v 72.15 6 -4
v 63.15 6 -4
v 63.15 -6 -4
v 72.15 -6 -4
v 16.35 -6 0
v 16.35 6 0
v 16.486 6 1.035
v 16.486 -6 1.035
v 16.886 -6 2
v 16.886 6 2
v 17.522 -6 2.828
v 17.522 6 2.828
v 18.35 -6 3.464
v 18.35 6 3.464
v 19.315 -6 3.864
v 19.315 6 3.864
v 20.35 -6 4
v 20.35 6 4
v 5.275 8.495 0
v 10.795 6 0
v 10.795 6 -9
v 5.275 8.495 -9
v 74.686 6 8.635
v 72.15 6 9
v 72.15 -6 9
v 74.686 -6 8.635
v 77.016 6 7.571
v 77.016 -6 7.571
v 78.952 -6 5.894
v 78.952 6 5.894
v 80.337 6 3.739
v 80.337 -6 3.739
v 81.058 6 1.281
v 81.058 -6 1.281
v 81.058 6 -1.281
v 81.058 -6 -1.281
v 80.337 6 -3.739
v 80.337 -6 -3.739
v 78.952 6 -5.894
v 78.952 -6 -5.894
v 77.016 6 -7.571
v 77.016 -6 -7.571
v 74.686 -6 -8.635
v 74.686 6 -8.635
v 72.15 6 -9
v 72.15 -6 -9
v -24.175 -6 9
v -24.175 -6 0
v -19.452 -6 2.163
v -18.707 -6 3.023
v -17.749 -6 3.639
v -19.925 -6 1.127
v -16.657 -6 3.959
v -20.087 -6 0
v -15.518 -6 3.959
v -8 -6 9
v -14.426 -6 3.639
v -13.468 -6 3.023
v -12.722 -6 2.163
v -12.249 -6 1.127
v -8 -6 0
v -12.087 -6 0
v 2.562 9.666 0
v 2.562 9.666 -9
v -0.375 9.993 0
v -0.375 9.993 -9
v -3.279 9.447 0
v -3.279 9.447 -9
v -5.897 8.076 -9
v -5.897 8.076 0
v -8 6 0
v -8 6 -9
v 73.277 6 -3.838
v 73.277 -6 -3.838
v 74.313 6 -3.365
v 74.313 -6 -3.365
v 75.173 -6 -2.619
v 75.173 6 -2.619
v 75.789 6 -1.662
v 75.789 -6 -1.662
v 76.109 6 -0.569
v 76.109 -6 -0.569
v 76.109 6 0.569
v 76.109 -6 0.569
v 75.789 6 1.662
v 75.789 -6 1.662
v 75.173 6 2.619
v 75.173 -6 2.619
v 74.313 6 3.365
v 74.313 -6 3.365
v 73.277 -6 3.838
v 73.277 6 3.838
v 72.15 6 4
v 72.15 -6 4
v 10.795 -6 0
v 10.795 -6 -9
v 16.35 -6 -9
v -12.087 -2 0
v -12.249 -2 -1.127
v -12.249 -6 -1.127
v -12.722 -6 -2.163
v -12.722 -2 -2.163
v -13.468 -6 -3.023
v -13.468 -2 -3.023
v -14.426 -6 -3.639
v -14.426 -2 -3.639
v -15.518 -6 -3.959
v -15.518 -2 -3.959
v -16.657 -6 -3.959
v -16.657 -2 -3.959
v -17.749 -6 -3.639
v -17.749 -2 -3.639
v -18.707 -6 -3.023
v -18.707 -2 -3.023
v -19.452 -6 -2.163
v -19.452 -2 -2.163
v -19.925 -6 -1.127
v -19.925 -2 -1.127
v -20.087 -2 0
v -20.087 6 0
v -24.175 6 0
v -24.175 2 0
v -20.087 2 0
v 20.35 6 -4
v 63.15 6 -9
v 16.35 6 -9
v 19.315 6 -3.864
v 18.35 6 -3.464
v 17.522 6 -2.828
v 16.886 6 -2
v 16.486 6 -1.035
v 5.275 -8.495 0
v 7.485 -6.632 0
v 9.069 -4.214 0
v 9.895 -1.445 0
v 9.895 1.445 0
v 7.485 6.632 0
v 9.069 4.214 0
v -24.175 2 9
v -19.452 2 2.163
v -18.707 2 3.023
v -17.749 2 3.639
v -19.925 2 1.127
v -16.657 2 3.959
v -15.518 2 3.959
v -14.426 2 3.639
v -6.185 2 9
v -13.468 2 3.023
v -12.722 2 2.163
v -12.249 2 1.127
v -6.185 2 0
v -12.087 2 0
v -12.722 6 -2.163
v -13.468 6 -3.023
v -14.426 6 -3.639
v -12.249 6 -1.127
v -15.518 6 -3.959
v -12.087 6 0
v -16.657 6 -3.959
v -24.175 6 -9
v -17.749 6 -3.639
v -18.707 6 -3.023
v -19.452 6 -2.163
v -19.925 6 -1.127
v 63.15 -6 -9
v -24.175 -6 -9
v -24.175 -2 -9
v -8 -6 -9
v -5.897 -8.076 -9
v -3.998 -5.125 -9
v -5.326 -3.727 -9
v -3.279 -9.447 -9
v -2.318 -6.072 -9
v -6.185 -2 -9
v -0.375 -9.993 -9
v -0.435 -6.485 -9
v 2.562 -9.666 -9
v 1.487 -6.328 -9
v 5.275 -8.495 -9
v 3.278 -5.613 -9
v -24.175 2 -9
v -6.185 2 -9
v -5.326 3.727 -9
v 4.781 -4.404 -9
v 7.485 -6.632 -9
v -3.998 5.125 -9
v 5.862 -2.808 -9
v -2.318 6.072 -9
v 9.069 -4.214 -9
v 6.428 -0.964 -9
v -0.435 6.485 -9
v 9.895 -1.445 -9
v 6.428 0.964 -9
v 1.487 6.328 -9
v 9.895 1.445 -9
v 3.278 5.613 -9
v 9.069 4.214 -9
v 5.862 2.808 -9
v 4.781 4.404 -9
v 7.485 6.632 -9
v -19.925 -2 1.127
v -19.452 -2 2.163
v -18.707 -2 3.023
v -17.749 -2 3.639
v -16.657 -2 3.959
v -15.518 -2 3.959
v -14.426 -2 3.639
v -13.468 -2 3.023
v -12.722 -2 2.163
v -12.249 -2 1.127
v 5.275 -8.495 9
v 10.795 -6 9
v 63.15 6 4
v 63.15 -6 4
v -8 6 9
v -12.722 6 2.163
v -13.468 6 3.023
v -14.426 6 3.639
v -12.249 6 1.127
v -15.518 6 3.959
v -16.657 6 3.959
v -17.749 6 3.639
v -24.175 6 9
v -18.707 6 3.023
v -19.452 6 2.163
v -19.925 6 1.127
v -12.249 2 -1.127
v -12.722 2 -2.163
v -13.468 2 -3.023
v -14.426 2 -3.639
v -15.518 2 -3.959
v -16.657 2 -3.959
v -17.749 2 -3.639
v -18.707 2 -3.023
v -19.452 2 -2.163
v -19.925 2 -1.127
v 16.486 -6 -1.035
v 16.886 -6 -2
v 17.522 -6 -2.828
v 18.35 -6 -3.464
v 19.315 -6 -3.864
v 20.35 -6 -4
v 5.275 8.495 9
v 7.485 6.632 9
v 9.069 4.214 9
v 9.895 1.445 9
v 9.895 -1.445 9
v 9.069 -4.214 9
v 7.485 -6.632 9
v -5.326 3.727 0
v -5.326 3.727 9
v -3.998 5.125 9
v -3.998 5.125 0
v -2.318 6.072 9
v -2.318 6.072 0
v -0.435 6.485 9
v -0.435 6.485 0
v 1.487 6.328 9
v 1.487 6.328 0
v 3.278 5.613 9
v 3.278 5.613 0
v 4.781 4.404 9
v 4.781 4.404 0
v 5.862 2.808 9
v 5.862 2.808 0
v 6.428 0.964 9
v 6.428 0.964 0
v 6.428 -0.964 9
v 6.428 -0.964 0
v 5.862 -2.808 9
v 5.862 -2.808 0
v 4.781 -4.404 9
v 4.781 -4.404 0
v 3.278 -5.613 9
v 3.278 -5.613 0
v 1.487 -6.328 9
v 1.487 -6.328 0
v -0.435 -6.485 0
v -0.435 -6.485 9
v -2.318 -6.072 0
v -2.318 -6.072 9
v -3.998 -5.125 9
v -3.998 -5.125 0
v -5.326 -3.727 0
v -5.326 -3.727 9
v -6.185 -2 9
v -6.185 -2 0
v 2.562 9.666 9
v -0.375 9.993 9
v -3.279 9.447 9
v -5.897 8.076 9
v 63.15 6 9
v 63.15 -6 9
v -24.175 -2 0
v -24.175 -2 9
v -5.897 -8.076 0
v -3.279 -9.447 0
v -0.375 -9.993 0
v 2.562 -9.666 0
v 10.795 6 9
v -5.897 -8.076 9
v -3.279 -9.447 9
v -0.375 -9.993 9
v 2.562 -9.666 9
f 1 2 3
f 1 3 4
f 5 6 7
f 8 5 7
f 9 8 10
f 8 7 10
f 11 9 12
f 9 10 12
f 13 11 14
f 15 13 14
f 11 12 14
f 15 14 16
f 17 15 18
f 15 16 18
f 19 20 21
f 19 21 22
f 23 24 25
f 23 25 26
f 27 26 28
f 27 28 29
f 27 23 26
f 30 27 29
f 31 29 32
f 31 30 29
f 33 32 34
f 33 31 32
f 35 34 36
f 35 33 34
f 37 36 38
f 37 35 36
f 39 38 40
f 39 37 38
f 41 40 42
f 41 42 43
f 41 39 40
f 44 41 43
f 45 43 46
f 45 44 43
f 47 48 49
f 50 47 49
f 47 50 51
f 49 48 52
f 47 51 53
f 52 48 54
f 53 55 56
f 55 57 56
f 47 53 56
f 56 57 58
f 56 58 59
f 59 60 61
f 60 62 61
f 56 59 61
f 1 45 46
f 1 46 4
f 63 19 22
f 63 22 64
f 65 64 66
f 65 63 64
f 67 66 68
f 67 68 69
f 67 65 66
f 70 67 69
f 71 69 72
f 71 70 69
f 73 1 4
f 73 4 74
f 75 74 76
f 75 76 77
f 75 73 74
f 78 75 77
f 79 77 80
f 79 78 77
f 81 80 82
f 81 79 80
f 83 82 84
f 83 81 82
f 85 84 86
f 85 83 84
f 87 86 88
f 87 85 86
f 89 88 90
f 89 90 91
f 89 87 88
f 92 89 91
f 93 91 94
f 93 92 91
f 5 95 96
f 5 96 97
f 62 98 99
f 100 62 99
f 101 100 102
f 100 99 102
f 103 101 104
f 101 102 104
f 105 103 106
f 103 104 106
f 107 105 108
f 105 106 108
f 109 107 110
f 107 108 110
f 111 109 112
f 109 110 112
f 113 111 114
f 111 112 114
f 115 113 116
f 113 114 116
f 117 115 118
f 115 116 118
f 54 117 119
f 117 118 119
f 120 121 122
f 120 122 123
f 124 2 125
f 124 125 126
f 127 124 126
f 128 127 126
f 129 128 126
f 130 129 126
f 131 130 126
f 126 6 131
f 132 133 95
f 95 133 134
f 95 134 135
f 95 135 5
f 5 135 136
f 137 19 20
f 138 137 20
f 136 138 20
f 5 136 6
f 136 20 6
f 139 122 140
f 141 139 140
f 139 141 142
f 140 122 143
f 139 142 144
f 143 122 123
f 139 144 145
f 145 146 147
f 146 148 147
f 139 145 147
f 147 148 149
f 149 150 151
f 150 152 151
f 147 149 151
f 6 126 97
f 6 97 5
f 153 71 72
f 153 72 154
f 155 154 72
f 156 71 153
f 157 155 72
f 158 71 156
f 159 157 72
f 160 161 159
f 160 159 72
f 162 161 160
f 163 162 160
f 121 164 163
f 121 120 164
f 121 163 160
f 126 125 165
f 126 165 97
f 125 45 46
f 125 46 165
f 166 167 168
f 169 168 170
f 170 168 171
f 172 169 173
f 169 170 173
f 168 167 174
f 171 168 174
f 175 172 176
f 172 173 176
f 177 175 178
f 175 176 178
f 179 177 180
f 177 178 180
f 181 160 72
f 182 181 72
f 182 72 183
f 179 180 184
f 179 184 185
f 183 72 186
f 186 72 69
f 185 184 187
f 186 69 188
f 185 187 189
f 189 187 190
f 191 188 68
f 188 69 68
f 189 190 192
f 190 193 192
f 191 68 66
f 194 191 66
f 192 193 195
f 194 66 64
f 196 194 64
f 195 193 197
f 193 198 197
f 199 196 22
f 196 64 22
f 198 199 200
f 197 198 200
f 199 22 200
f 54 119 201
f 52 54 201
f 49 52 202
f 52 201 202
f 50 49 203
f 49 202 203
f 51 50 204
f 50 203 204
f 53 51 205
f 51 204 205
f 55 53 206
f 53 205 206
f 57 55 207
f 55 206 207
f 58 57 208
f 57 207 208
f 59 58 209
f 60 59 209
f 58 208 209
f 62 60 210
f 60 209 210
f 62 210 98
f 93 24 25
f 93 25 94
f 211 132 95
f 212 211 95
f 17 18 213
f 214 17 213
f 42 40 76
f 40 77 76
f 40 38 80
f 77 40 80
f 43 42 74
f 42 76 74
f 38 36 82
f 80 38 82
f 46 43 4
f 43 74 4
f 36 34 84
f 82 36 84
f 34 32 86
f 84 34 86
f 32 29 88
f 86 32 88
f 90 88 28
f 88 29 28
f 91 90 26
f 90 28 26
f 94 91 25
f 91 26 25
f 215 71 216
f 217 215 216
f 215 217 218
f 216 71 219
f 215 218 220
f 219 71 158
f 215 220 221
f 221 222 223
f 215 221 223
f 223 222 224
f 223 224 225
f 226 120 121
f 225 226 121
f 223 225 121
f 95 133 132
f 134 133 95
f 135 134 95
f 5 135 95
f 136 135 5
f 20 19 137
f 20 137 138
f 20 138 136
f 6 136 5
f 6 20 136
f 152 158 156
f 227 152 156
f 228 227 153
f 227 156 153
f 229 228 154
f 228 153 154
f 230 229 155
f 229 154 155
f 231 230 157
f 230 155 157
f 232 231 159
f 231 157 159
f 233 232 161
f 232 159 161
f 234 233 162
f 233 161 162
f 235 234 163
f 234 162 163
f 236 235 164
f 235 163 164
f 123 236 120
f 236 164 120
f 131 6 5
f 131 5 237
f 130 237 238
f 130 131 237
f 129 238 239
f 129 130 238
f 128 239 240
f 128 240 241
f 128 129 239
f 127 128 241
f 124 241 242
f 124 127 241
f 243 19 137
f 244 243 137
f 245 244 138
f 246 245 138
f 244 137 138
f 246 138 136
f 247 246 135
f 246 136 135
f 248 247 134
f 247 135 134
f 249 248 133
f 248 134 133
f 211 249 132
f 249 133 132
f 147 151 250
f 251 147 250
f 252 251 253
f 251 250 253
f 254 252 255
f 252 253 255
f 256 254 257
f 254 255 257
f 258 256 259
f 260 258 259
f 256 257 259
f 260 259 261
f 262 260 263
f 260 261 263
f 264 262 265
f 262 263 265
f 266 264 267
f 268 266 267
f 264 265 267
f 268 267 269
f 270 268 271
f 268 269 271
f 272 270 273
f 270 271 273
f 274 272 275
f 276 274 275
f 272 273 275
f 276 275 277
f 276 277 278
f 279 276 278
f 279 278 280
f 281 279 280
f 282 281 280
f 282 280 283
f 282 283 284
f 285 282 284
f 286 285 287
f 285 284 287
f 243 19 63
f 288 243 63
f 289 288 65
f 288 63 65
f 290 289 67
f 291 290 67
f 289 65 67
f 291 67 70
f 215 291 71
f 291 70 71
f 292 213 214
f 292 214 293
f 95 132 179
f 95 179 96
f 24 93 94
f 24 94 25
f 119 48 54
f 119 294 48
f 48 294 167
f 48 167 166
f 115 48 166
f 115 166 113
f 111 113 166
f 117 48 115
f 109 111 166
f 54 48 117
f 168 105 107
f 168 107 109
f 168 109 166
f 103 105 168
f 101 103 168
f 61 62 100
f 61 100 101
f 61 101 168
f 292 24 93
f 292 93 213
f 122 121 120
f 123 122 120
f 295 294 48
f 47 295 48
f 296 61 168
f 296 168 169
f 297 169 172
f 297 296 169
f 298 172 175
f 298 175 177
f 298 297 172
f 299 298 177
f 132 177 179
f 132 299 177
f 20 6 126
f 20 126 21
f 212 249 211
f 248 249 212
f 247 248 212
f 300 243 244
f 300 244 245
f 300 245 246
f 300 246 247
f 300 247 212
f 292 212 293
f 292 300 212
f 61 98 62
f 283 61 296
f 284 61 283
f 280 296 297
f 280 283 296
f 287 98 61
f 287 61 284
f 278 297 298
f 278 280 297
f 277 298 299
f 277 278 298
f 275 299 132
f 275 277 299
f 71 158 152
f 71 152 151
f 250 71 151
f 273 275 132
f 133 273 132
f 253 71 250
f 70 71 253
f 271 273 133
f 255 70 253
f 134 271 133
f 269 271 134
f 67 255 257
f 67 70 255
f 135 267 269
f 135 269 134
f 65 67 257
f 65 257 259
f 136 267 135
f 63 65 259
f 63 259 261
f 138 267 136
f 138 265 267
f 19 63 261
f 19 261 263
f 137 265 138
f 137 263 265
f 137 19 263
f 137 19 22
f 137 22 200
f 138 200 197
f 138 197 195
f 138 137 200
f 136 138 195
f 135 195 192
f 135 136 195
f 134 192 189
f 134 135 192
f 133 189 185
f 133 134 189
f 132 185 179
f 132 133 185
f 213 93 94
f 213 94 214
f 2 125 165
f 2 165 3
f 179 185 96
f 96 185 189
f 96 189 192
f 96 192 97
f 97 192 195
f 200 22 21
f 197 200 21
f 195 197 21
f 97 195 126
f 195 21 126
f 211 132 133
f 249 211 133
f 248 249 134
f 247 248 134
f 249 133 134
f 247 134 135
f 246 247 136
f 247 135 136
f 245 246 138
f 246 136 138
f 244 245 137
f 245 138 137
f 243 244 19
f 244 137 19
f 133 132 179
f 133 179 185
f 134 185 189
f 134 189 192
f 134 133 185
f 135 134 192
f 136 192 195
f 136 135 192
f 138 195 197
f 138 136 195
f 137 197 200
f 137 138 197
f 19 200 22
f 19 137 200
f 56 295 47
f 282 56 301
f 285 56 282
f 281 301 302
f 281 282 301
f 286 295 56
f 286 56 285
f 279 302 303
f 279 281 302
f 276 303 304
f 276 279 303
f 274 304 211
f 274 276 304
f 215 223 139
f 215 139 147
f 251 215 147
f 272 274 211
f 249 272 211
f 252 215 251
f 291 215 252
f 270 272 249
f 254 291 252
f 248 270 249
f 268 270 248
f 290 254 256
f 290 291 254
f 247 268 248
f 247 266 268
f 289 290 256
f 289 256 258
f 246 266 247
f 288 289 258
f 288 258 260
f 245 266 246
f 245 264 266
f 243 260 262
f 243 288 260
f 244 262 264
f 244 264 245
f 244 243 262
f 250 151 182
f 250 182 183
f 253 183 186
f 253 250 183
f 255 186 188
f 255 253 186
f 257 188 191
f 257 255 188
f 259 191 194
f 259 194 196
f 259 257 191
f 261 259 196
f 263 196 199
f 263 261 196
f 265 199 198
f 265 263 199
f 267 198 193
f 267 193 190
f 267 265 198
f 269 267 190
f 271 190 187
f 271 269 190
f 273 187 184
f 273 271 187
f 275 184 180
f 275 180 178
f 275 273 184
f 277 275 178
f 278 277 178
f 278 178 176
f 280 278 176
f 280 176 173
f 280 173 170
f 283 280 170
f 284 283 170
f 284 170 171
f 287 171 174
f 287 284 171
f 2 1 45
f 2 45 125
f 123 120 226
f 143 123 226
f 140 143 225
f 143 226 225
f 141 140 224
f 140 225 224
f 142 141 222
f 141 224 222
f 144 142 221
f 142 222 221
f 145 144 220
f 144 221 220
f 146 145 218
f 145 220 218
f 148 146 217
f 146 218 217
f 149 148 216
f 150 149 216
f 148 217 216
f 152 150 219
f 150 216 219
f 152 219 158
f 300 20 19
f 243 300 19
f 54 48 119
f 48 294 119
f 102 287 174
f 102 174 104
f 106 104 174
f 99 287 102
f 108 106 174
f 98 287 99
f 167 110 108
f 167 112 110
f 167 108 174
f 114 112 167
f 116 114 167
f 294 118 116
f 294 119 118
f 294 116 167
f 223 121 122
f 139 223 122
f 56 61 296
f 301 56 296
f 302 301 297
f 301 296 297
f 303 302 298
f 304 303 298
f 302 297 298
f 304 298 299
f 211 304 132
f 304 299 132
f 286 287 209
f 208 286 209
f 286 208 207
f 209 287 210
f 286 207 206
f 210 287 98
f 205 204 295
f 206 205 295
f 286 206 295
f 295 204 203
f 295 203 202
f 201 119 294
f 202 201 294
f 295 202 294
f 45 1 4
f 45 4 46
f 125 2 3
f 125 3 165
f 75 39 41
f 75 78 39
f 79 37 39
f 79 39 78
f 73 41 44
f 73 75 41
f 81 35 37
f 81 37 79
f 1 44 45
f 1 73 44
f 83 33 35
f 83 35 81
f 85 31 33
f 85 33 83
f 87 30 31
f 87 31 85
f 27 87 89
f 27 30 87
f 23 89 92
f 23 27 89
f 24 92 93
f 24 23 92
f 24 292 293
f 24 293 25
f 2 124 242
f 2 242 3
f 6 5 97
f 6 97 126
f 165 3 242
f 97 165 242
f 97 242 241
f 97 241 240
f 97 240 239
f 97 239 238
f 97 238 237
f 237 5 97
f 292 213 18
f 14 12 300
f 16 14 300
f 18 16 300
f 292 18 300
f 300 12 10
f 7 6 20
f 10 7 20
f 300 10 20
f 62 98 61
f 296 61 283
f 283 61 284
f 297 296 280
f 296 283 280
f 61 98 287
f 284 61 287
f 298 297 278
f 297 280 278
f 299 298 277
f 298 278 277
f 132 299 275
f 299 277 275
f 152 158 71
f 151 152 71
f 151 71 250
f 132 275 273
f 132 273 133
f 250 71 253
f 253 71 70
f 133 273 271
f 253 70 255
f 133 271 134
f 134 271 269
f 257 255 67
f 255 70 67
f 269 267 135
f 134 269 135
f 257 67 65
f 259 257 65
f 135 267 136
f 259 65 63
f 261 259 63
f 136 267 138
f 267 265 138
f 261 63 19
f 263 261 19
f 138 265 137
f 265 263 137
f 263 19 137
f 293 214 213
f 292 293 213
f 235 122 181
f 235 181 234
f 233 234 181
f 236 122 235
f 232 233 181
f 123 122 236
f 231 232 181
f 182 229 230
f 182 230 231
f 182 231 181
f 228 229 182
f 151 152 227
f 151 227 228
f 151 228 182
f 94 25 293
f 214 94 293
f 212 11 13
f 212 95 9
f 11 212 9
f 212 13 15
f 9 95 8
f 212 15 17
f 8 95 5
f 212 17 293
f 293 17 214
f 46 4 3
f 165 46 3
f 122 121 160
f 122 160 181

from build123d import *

# Parameters (mm, degrees)
F1_DEPTH  = 9
F2_DEPTH  = 9
F4_DEPTH  = 9
F5_DEPTH  = 9
F6_DEPTH  = 9
F8_D      = 8
F8_2_D    = 8
F3_W      = 42.8
F3_H      = 4
F9_DEPTH  = 25
F10_DEPTH = 12
F11_DEPTH = 12
F12_DEPTH = 12


# Not quite as in the source:
# - a feature names something its author has since deleted; it is built from what else it names


with BuildPart() as f1:
    # F0 (on Top) → F1 (new body)
    with BuildSketch(Plane.XY):
        with BuildLine():
            ThreePointArc((5.2753381173, -8.4953403551), (10, 0), (5.2753381173, 8.4953403551))
            ThreePointArc((5.2753381173, 8.4953403551), (-1.8473295498, 9.8278875418), (-8, 6))
            Line((-8, 6), (-24.1746007293, 6))
            Line((-24.1746007293, 6), (-24.1746007293, 2))
            Line((-24.1746007293, 2), (-8.1069414701, 2))
            Line((-8.1069414701, 2), (-6.1846584384, 2))
            ThreePointArc((-6.1846584384, 2), (6.5, 0), (-6.1846584384, -2))
            Line((-6.1846584384, -2), (-8.1069414701, -2))
            Line((-8.1069414701, -2), (-24.1746007293, -2))
            Line((-24.1746007293, -2), (-24.1746007293, -6))
            Line((-24.1746007293, -6), (-8, -6))
            ThreePointArc((-8, -6), (-1.8473295498, -9.8278875418), (5.2753381173, -8.4953403551))
        make_face()
    extrude(amount=F1_DEPTH)

    # F8 (through all)
    with Locations(Plane.XZ.offset(6)):
        with Locations((-16.0873003646, 0)):
            Hole(F8_D / 2)


with BuildPart() as f2:
    # F0 (on Top) → F2 (new body)
    with BuildSketch(Plane.XY):
        Polygon((63.15, 0), (16.35, 0), (16.35, -6), (62.2006830499, -6), (63.15, -6), (63.15, -5.0506830499), (63.15, -3.4493169501), (63.15, -2.5), align=None)
        Polygon((16.35, 6), (16.35, 0), (63.15, 0), (63.15, 2.5), (63.15, 3.4493169501), (63.15, 5.0506830499), (63.15, 6), (62.2006830499, 6), align=None)
    extrude(amount=F2_DEPTH)

    # F0 (on Top) → F4 (join)
    with BuildSketch(Plane.XY):
        with BuildLine():
            Line((16.35, -6), (16.35, 0))
            Line((16.35, 0), (16.35, 6))
            Line((16.35, 6), (10.7945588145, 6))
            Line((10.7945588145, 6), (5.2753381173, 8.4953403551))
            ThreePointArc((5.2753381173, 8.4953403551), (10, 0), (5.2753381173, -8.4953403551))
            Line((5.2753381173, -8.4953403551), (10.7945588145, -6))
            Line((10.7945588145, -6), (16.35, -6))
        make_face()
    extrude(amount=F4_DEPTH)

    # F3 (on face) → F9 (cut)
    with BuildSketch(Plane(origin=(0, 6, 0), x_dir=(-1, 0, 0), z_dir=(0, 1, 0))):
        with Locations((-41.75, 2)):
            Rectangle(F3_W, F3_H)
        Polygon((-20.35, 0), (-63.15, 0), (-63.15, -4), (-42.4068458378, -4), (-20.35, -4), align=None)
        with BuildLine():
            Line((-16.35, 0), (-20.35, 0))
            Line((-20.35, 0), (-20.35, -4))
            ThreePointArc((-20.35, -4), (-17.5215728753, -2.8284271247), (-16.35, 0))
        make_face()
        with BuildLine():
            Line((-20.35, 4), (-20.35, 0))
            Line((-20.35, 0), (-16.35, 0))
            ThreePointArc((-16.35, 0), (-17.5215728753, 2.8284271247), (-20.35, 4))
        make_face()
        with BuildLine():
            Line((-68.15, 0), (-63.15, 0))
            ThreePointArc((-63.15, 0), (-63.3875711206, 2.0542249469), (-64.0877422517, 4))
            Line((-64.0877422517, 4), (-72.15, 4))
            ThreePointArc((-72.15, 4), (-69.3215728753, 2.8284271247), (-68.15, 0))
        make_face()
        with BuildLine():
            ThreePointArc((-64.0877422517, -4), (-63.3875711206, -2.0542249469), (-63.15, 0))
            Line((-63.15, 0), (-68.15, 0))
            ThreePointArc((-68.15, 0), (-69.3215728753, -2.8284271247), (-72.15, -4))
            Line((-72.15, -4), (-64.0877422517, -4))
        make_face()
        with BuildLine():
            ThreePointArc((-64.0877422517, 4), (-63.3875711206, 2.0542249469), (-63.15, 0))
            Line((-63.15, 0), (-63.15, 4))
            Line((-63.15, 4), (-64.0877422517, 4))
        make_face()
        with BuildLine():
            Line((-63.15, -4), (-63.15, 0))
            ThreePointArc((-63.15, 0), (-63.3875711206, -2.0542249469), (-64.0877422517, -4))
            Line((-64.0877422517, -4), (-63.15, -4))
        make_face()
        with BuildLine():
            Line((-72.15, 0), (-68.15, 0))
            ThreePointArc((-68.15, 0), (-69.3215728753, 2.8284271247), (-72.15, 4))
            Line((-72.15, 4), (-72.15, 0))
        make_face()
        with BuildLine():
            ThreePointArc((-72.15, -4), (-69.3215728753, -2.8284271247), (-68.15, 0))
            Line((-68.15, 0), (-72.15, 0))
            Line((-72.15, 0), (-72.15, -4))
        make_face()
        with BuildLine():
            Line((-72.15, -4), (-72.15, 0))
            Line((-72.15, 0), (-72.15, 4))
            ThreePointArc((-72.15, 4), (-76.15, 0), (-72.15, -4))
        make_face()
    extrude(amount=-F9_DEPTH, mode=Mode.SUBTRACT)


with BuildPart() as f5:
    # F0 (on Top) → F5 (new body)
    with BuildSketch(Plane.XY):
        with BuildLine():
            Line((16.35, -6), (16.35, 0))
            Line((16.35, 0), (16.35, 6))
            Line((16.35, 6), (10.7945588145, 6))
            Line((10.7945588145, 6), (5.2753381173, 8.4953403551))
            ThreePointArc((5.2753381173, 8.4953403551), (10, 0), (5.2753381173, -8.4953403551))
            Line((5.2753381173, -8.4953403551), (10.7945588145, -6))
            Line((10.7945588145, -6), (16.35, -6))
        make_face()
    extrude(amount=-F5_DEPTH)


with BuildPart() as f6:
    # F0 (on Top) → F6 (new body)
    with BuildSketch(Plane.XY):
        with BuildLine():
            ThreePointArc((5.2753381173, -8.4953403551), (10, 0), (5.2753381173, 8.4953403551))
            ThreePointArc((5.2753381173, 8.4953403551), (-1.8473295498, 9.8278875418), (-8, 6))
            Line((-8, 6), (-24.1746007293, 6))
            Line((-24.1746007293, 6), (-24.1746007293, 2))
            Line((-24.1746007293, 2), (-8.1069414701, 2))
            Line((-8.1069414701, 2), (-6.1846584384, 2))
            ThreePointArc((-6.1846584384, 2), (6.5, 0), (-6.1846584384, -2))
            Line((-6.1846584384, -2), (-8.1069414701, -2))
            Line((-8.1069414701, -2), (-24.1746007293, -2))
            Line((-24.1746007293, -2), (-24.1746007293, -6))
            Line((-24.1746007293, -6), (-8, -6))
            ThreePointArc((-8, -6), (-1.8473295498, -9.8278875418), (5.2753381173, -8.4953403551))
        make_face()
    extrude(amount=-F6_DEPTH)

    # F8#2 (through all)
    with Locations(Plane.XZ.offset(6)):
        with Locations((-16.0873003646, 0)):
            Hole(F8_2_D / 2)


with BuildPart() as f10:
    # F3 (on face) → F10 (new body)
    with BuildSketch(Plane(origin=(0, 6, 0), x_dir=(-1, 0, 0), z_dir=(0, 1, 0))):
        with BuildLine():
            ThreePointArc((-72.15, 9), (-67.4065835097, 7.6485292704), (-64.0877422517, 4))
            Line((-64.0877422517, 4), (-63.15, 4))
            Line((-63.15, 4), (-63.15, 9))
            Line((-63.15, 9), (-72.15, 9))
        make_face()
        with BuildLine():
            Line((-72.15, 4), (-64.0877422517, 4))
            ThreePointArc((-64.0877422517, 4), (-67.4065835097, 7.6485292704), (-72.15, 9))
            Line((-72.15, 9), (-72.15, 4))
        make_face()
    extrude(amount=-F10_DEPTH)


with BuildPart() as f10b:
    # F3 (on face) → F10, piece 2 (new body)
    with BuildSketch(Plane(origin=(0, 6, 0), x_dir=(-1, 0, 0), z_dir=(0, 1, 0))):
        with BuildLine():
            Line((-63.15, -4), (-64.0877422517, -4))
            ThreePointArc((-64.0877422517, -4), (-67.4065835097, -7.6485292704), (-72.15, -9))
            Line((-72.15, -9), (-63.15, -9))
            Line((-63.15, -9), (-63.15, -4))
        make_face()
        with BuildLine():
            ThreePointArc((-72.15, -9), (-67.4065835097, -7.6485292704), (-64.0877422517, -4))
            Line((-64.0877422517, -4), (-72.15, -4))
            Line((-72.15, -4), (-72.15, -9))
        make_face()
    extrude(amount=-F10_DEPTH)


with BuildPart() as f11:
    # F3 (on face) → F11 (new body)
    with BuildSketch(Plane(origin=(0, 6, 0), x_dir=(-1, 0, 0), z_dir=(0, 1, 0))):
        Polygon((-42.4068458378, -4), (-63.15, -4), (-63.15, -9), (-16.35, -9), (-16.35, -4), (-20.35, -4), align=None)
        with BuildLine():
            Line((-16.35, -4), (-16.35, 0))
            ThreePointArc((-16.35, 0), (-17.5215728753, -2.8284271247), (-20.35, -4))
            Line((-20.35, -4), (-16.35, -4))
        make_face()
    extrude(amount=-F11_DEPTH)


with BuildPart() as f12:
    # F3 (on face) → F12 (new body)
    with BuildSketch(Plane(origin=(0, 6, 0), x_dir=(-1, 0, 0), z_dir=(0, 1, 0))):
        with BuildLine():
            ThreePointArc((-72.15, -4), (-76.15, 0), (-72.15, 4))
            Line((-72.15, 4), (-72.15, 9))
            ThreePointArc((-72.15, 9), (-81.15, 0), (-72.15, -9))
            Line((-72.15, -9), (-72.15, -4))
        make_face()
    extrude(amount=-F12_DEPTH)


solid = Compound([f1.part, f2.part, f5.part, f6.part, f10.part, f10b.part, f11.part, f12.part])
